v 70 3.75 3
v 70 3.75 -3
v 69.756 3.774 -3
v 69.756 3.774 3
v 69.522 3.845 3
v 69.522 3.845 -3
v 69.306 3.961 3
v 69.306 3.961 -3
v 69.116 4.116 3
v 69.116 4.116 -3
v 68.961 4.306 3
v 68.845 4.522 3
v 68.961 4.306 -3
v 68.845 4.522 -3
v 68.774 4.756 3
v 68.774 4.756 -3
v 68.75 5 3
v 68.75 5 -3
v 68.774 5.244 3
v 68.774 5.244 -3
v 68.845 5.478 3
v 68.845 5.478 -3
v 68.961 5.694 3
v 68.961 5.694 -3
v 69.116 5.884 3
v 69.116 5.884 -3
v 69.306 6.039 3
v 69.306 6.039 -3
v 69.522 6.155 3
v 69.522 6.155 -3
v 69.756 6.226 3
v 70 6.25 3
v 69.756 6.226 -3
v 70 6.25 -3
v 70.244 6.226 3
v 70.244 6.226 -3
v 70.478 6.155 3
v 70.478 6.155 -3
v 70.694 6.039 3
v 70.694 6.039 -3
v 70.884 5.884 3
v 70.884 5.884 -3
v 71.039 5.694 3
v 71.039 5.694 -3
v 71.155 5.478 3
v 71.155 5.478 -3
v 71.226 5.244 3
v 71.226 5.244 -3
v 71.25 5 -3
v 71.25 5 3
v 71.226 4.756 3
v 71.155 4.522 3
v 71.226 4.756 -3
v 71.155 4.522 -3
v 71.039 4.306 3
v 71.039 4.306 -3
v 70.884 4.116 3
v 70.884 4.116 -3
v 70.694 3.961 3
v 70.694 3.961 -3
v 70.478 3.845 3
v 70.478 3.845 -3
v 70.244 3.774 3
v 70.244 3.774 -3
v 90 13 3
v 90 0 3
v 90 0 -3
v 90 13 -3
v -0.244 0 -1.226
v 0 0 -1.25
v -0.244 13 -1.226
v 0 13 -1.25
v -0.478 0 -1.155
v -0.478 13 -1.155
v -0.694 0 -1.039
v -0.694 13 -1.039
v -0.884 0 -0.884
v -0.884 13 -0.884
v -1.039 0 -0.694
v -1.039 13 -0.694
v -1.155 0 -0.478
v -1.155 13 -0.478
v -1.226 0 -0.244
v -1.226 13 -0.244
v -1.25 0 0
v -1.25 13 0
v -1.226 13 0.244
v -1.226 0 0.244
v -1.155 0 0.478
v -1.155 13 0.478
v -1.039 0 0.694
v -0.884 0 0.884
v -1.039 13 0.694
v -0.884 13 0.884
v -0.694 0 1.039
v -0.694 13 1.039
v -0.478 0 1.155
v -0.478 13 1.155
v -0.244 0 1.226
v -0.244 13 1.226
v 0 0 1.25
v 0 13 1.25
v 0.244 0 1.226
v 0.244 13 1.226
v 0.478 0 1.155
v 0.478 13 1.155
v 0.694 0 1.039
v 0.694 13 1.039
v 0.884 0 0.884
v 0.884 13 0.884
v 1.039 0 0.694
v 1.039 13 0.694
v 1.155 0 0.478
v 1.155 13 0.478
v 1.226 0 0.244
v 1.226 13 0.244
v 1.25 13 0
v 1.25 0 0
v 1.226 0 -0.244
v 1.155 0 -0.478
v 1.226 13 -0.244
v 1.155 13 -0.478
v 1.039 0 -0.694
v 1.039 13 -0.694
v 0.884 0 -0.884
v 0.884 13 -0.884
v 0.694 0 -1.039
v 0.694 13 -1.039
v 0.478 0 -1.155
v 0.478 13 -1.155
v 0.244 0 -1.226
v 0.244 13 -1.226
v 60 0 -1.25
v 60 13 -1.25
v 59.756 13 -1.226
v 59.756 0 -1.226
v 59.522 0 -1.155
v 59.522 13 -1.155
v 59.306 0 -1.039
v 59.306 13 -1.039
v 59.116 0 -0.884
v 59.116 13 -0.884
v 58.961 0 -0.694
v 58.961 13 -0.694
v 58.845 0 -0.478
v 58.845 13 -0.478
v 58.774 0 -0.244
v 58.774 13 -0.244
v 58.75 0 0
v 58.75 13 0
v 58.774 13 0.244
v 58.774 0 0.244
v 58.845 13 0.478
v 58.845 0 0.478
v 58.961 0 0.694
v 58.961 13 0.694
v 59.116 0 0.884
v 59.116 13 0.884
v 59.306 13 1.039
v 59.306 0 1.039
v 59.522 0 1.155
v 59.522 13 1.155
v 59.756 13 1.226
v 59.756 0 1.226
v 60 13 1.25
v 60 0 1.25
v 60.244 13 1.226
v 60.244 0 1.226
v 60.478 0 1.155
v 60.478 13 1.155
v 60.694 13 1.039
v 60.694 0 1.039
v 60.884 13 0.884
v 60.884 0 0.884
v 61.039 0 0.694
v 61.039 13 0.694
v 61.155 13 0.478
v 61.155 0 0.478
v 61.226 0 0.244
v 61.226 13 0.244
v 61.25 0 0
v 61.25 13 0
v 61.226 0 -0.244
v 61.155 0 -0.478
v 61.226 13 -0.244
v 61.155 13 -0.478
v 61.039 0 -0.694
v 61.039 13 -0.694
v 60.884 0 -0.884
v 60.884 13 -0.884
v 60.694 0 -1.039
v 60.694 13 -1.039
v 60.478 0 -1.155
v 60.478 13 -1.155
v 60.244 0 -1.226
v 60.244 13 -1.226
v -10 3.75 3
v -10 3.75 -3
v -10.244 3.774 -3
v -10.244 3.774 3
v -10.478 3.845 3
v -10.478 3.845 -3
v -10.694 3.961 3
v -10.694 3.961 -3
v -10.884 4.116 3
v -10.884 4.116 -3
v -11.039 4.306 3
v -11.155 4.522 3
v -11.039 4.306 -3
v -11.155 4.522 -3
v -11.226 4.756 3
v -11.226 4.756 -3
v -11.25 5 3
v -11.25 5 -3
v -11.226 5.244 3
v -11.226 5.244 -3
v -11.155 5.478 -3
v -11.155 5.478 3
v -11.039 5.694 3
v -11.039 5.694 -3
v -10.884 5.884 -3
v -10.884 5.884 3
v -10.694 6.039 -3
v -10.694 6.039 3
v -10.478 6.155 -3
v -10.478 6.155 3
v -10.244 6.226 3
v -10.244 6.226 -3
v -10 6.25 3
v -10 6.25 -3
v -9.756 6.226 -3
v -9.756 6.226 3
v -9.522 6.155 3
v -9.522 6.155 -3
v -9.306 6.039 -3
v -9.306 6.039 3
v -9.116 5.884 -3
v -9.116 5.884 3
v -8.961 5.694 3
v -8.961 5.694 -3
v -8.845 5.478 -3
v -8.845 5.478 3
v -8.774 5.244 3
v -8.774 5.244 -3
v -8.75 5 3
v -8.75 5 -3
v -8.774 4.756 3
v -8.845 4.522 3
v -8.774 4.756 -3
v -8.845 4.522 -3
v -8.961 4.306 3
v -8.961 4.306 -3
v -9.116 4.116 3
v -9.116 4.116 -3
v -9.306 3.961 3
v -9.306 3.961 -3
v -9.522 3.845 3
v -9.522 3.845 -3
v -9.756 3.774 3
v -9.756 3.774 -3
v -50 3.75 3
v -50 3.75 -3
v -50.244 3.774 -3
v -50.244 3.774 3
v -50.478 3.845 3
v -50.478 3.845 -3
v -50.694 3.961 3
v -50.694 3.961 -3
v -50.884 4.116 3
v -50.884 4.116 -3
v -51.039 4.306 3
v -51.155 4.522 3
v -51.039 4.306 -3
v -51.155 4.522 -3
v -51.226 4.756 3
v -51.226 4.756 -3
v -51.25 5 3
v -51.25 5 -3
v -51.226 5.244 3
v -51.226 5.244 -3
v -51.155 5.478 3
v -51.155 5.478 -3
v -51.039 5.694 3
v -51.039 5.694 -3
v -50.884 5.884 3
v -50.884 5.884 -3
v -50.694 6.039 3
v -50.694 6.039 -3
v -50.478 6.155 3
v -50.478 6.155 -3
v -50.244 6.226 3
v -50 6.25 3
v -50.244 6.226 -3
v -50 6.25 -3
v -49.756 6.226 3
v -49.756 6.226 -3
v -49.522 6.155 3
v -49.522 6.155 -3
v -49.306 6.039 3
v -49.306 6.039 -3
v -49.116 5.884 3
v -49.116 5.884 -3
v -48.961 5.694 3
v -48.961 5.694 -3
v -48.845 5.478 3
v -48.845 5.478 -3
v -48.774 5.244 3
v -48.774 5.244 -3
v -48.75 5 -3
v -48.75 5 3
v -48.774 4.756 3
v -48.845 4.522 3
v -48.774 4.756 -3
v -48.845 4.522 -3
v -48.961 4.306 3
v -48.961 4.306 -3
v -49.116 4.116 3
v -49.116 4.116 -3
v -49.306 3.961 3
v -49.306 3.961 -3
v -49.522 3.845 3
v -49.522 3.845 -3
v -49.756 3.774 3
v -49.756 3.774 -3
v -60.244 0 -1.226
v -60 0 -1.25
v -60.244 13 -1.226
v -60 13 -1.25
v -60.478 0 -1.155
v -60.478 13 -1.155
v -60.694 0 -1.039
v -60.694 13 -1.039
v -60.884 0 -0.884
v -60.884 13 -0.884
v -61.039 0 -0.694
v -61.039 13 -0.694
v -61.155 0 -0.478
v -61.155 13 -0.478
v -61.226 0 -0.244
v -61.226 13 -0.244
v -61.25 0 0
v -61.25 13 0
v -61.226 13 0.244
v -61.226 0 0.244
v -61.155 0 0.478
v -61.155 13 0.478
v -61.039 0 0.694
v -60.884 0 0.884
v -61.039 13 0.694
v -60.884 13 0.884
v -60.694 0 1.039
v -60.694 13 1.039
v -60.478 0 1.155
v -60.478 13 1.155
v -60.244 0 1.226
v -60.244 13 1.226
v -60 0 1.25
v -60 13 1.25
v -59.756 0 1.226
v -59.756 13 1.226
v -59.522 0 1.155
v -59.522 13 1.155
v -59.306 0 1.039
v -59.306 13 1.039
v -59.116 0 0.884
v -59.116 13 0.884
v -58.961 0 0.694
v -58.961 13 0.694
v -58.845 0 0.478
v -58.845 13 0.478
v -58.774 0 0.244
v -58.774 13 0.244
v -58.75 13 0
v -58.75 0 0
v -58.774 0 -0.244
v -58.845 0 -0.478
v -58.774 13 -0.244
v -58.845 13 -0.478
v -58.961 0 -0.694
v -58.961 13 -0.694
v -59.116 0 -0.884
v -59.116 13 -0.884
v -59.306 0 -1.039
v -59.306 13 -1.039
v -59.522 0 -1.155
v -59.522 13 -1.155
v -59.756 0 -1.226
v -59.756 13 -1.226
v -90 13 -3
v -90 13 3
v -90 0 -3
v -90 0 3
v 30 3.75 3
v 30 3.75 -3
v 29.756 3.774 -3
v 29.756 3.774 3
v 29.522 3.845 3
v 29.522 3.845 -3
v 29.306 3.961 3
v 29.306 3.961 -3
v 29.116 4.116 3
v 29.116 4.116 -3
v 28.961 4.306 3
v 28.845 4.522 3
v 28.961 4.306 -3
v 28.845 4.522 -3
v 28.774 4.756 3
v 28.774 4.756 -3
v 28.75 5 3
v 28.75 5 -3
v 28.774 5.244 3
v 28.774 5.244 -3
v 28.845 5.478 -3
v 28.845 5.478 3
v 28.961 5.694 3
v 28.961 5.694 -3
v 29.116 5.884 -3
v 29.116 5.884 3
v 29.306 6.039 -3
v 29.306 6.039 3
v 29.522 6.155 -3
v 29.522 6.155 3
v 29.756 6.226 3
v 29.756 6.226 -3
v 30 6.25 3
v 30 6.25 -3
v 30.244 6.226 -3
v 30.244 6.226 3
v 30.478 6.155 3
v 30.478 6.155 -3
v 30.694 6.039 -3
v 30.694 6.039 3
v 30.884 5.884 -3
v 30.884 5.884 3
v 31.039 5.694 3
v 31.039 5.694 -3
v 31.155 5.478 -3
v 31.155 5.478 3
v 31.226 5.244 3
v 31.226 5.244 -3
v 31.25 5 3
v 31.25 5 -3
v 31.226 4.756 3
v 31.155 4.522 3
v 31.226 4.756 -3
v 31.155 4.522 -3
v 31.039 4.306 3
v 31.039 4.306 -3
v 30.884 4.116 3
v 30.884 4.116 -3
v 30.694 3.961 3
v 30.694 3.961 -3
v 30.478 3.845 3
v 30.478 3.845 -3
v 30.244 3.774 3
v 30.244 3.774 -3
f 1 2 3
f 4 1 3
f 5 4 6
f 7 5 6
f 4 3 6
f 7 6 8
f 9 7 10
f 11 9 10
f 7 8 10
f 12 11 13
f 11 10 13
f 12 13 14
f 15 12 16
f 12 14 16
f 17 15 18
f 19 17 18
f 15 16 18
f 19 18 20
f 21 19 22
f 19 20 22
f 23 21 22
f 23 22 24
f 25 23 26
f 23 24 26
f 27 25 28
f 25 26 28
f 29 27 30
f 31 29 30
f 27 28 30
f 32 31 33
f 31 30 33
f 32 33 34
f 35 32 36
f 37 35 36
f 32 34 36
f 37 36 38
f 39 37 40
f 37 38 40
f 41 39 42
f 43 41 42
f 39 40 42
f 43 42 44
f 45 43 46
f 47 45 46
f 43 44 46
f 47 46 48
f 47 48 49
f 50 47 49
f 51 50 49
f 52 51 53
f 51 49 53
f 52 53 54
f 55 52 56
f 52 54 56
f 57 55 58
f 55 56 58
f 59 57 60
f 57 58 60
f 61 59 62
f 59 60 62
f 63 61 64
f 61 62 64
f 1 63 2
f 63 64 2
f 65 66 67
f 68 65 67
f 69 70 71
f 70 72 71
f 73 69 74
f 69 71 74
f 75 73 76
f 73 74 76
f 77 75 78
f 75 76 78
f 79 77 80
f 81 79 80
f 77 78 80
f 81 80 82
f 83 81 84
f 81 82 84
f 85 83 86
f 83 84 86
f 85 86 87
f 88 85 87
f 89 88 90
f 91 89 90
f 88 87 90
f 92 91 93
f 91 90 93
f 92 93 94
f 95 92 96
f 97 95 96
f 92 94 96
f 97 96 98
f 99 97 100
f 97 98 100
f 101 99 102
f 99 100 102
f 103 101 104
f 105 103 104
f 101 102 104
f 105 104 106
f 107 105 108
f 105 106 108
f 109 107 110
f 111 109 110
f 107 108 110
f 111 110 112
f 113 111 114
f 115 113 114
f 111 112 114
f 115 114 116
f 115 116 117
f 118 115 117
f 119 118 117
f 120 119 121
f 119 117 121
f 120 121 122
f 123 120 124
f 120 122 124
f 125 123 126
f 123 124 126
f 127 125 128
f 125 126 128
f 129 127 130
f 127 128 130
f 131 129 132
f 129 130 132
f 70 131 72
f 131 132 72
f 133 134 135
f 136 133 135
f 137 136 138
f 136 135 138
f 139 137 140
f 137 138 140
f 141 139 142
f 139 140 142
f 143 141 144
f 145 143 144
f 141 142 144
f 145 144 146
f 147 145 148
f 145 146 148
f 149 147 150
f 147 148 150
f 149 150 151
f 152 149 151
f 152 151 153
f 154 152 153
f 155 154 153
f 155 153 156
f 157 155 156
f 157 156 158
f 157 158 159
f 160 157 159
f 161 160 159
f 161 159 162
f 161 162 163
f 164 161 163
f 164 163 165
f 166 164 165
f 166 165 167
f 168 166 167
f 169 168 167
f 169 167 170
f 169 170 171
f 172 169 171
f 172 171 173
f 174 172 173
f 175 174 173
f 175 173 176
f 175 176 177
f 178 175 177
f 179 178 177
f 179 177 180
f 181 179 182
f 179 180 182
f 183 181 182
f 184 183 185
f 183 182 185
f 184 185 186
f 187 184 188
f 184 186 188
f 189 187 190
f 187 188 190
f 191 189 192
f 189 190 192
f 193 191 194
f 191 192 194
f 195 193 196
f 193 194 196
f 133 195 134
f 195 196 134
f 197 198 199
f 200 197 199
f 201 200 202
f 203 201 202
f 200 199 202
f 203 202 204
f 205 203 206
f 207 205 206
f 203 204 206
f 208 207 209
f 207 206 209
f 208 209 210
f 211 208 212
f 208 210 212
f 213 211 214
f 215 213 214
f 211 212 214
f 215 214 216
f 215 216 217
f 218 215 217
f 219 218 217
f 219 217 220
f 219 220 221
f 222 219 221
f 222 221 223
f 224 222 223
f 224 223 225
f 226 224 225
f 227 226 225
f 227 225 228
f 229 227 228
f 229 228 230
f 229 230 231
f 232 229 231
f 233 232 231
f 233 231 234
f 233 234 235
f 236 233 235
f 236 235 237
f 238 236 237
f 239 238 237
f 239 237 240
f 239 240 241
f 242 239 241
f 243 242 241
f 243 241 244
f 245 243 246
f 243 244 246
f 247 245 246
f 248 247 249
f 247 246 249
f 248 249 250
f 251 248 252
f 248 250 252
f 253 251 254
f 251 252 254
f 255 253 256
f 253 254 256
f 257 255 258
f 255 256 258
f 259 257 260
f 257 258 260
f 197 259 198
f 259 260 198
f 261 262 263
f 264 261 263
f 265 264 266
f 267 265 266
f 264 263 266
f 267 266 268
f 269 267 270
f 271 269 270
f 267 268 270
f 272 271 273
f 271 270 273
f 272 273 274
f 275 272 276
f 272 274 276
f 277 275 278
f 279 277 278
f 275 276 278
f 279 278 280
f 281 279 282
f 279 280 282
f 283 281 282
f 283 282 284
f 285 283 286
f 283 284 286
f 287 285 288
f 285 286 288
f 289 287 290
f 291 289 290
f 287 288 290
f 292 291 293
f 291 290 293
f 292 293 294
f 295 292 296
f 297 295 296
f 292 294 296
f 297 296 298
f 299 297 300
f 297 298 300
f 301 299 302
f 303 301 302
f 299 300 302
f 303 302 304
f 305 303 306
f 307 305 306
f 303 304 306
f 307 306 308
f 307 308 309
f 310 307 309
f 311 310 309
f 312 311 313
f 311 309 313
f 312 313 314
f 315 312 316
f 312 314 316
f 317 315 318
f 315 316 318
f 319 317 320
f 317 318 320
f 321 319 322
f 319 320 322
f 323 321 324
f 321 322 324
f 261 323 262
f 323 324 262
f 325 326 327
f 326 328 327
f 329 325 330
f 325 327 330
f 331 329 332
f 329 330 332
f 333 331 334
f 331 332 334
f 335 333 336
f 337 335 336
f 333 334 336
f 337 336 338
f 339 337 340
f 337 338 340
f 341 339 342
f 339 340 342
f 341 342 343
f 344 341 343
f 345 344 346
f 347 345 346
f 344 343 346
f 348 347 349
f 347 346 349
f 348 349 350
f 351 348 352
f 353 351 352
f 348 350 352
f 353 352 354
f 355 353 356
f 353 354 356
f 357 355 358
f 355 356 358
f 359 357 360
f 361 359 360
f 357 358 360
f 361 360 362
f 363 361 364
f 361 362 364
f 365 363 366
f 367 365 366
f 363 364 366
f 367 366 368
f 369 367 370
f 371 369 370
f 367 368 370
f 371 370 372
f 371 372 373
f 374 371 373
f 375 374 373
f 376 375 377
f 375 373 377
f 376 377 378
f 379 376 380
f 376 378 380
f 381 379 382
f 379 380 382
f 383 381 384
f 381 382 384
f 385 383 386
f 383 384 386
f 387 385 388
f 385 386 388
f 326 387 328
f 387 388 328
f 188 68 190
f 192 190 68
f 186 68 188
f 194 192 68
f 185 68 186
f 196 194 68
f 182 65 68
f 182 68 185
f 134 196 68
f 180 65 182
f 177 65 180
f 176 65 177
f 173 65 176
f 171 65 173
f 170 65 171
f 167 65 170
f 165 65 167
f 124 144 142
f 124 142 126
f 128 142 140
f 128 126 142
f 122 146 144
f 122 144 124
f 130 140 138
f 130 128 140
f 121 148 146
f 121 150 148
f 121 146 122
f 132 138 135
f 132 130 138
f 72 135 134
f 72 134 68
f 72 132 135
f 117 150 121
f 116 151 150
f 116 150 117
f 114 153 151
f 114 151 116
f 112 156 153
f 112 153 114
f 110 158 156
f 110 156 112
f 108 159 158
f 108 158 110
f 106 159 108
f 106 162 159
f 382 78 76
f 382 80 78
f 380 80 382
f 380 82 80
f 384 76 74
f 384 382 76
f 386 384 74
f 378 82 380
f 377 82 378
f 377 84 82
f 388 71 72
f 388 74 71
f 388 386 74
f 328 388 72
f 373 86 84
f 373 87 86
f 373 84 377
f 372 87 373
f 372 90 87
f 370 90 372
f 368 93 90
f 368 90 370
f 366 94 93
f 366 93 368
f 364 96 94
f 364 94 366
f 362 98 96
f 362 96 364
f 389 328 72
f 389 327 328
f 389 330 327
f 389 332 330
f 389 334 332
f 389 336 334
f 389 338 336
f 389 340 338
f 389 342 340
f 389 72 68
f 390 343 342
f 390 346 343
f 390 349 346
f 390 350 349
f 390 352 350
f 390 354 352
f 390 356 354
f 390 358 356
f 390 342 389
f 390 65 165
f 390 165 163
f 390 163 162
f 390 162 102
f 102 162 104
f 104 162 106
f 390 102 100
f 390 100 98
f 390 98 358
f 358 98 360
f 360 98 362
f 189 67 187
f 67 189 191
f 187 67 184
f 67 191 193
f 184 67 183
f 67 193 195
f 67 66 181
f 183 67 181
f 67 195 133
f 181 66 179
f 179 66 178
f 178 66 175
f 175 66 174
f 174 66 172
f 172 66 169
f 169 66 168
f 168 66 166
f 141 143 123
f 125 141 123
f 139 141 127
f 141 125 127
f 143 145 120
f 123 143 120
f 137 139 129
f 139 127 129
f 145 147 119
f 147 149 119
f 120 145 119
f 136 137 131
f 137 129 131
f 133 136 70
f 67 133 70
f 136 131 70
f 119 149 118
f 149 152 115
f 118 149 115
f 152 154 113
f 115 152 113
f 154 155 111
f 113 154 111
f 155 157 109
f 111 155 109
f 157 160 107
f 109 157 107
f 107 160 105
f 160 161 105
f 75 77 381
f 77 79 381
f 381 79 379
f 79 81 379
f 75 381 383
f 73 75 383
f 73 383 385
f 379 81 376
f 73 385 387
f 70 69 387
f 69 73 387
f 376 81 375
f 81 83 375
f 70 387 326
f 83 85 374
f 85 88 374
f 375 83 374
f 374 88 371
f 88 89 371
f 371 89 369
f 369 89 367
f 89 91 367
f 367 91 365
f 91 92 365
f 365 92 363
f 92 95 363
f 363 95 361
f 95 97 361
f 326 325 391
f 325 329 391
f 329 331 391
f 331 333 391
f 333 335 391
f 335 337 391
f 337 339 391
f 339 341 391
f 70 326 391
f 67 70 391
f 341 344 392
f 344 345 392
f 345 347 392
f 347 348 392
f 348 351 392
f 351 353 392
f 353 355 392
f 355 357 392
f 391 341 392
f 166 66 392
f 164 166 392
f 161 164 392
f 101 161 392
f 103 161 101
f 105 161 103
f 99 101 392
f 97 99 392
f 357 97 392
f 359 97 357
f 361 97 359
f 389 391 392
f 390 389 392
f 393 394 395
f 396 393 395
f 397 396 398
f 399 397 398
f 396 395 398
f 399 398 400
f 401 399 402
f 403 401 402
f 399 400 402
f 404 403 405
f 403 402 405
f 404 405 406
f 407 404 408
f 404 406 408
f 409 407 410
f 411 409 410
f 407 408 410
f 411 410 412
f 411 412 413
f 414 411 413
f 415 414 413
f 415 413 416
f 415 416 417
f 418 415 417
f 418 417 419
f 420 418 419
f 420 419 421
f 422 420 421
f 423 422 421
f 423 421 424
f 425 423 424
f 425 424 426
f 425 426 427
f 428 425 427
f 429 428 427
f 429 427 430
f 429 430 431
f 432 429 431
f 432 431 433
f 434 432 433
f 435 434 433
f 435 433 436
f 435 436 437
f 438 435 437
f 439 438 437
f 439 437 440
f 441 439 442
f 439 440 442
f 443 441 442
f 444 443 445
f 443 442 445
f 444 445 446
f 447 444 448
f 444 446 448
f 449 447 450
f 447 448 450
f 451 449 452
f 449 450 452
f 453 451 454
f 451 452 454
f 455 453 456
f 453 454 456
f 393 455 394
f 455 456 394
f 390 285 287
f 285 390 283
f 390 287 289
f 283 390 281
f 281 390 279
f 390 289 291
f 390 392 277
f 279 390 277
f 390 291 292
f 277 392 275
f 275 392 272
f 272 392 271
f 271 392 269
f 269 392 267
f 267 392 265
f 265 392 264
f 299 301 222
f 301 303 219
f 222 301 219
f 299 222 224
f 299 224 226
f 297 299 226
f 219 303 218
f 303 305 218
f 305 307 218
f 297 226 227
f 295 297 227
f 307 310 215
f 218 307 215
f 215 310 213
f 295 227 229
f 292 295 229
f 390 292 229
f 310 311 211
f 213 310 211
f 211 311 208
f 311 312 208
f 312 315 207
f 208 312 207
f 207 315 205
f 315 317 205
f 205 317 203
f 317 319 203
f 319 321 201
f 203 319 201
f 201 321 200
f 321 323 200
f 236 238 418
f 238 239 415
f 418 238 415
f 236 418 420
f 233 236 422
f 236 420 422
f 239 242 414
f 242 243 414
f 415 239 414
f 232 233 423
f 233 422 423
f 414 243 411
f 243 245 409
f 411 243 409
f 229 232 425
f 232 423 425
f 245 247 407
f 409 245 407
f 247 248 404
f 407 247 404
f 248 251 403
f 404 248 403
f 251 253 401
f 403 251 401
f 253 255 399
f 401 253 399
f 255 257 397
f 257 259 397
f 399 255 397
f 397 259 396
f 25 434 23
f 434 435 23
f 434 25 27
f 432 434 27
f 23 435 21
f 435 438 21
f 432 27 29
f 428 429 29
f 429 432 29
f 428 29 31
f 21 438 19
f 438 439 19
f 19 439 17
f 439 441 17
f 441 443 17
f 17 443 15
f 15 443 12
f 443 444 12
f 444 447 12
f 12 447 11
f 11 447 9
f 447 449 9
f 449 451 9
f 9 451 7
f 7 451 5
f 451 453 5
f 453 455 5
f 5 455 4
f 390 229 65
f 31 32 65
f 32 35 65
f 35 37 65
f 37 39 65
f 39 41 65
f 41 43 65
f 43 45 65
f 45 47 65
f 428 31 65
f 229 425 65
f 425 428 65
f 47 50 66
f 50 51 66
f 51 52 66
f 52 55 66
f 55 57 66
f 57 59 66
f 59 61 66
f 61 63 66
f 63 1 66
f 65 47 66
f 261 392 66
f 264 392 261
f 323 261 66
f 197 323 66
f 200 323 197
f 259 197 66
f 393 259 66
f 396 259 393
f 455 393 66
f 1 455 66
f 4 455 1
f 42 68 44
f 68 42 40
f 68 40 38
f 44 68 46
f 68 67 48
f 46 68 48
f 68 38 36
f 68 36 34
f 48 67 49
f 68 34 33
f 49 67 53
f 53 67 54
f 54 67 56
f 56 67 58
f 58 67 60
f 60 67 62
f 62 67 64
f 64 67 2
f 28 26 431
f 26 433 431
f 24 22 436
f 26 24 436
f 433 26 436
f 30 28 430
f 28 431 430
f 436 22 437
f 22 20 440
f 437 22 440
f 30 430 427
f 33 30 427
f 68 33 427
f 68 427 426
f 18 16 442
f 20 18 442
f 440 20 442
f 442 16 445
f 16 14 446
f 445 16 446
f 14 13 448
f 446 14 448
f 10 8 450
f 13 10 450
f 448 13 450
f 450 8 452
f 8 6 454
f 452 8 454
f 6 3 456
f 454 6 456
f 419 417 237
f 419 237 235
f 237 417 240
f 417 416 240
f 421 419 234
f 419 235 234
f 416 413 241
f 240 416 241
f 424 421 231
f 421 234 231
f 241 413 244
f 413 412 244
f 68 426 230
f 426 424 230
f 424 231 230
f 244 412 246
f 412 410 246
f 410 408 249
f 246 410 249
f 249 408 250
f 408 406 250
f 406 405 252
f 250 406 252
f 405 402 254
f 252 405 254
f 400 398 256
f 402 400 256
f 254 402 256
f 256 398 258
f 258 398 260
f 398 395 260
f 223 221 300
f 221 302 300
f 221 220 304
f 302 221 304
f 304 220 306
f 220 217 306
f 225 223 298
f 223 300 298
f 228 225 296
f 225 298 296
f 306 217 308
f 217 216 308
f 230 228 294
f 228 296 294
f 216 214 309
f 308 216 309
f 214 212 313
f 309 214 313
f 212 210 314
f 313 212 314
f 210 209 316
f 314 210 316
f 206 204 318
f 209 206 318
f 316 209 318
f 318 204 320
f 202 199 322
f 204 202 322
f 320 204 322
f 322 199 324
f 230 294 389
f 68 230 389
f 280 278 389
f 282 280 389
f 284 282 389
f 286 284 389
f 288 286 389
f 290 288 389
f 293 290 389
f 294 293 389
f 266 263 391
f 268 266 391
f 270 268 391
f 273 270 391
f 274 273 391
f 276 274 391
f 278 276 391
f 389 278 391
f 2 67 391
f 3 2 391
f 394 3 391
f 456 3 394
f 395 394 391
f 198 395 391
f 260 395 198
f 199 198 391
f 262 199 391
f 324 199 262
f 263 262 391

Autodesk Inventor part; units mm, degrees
ref_plane "YZ Plane" through (0, 0, 0) normal (1, 0, 0) x (0, 1, 0)
ref_plane "XZ Plane" through (0, 0, 0) normal (0, 1, 0) x (-1, 0, 0)
ref_plane "XY Plane" through (0, 0, 0) normal (0, 0, 1) x (1, 0, 0)
sketch "スケッチ2" plane through (0, 0, 0) normal (0, 1, 0) x (-1, 0, 0)
  line L0 (-90, -3) -> (90, -3)
  line L1 (90, -3) -> (90, 3)
  line L2 (90, 3) -> (-90, 3)
  line L3 (-90, 3) -> (-90, -3)
  line L4 (-90, -3) -> (90, 3) construction
  line L5 (90, -3) -> (-90, 3) construction
  point P0 (0, 0)
  dimension "d1" = 180
  dimension "d2" = 6
extrude "押し出し1" add sketch "スケッチ2" along normal blind 13
sketch "スケッチ3" plane through (-90, 0, 3) normal (0, 0, 1) x (1, 0, 0)
  line L0 (0, 0) -> (180, 0) projected
  line L1 (180, 0) -> (180, 13) projected
  point P0 (90, 0)
  point P1 (160, 5)
  point P2 (120, 5)
  point P3 (80, 5)
  point P4 (40, 5)
  dimension "d5" = 5
  dimension "d6" = 20
  dimension "d7" = 40
  dimension "d8" = 40
  dimension "d16" = 40
  dimension "d17" = 5
hole "穴1" at (70, 5, 3) at (30, 5, 3) at (-10, 5, 3) at (-50, 5, 3) direction (0, 0, -1) diameter 2.5 end through all
sketch "スケッチ4" plane through (0, 0, 0) normal (0, -1, 0) x (1, 0, 0)
  line L0 (90, 3) -> (90, -3) projected
  point P0 (0, 0)
  point P1 (60, 0)
  point P2 (0, 0)
  point P3 (-60, 0)
  dimension "d18" = 30
  dimension "d19" = 60
  dimension "d20" = 60
hole "穴2" at (60, 0, 0) at (0, 0, 0) at (-60, 0, 0) direction (0, 1, 0) diameter 2.5 end through all
properties part number "slider"
